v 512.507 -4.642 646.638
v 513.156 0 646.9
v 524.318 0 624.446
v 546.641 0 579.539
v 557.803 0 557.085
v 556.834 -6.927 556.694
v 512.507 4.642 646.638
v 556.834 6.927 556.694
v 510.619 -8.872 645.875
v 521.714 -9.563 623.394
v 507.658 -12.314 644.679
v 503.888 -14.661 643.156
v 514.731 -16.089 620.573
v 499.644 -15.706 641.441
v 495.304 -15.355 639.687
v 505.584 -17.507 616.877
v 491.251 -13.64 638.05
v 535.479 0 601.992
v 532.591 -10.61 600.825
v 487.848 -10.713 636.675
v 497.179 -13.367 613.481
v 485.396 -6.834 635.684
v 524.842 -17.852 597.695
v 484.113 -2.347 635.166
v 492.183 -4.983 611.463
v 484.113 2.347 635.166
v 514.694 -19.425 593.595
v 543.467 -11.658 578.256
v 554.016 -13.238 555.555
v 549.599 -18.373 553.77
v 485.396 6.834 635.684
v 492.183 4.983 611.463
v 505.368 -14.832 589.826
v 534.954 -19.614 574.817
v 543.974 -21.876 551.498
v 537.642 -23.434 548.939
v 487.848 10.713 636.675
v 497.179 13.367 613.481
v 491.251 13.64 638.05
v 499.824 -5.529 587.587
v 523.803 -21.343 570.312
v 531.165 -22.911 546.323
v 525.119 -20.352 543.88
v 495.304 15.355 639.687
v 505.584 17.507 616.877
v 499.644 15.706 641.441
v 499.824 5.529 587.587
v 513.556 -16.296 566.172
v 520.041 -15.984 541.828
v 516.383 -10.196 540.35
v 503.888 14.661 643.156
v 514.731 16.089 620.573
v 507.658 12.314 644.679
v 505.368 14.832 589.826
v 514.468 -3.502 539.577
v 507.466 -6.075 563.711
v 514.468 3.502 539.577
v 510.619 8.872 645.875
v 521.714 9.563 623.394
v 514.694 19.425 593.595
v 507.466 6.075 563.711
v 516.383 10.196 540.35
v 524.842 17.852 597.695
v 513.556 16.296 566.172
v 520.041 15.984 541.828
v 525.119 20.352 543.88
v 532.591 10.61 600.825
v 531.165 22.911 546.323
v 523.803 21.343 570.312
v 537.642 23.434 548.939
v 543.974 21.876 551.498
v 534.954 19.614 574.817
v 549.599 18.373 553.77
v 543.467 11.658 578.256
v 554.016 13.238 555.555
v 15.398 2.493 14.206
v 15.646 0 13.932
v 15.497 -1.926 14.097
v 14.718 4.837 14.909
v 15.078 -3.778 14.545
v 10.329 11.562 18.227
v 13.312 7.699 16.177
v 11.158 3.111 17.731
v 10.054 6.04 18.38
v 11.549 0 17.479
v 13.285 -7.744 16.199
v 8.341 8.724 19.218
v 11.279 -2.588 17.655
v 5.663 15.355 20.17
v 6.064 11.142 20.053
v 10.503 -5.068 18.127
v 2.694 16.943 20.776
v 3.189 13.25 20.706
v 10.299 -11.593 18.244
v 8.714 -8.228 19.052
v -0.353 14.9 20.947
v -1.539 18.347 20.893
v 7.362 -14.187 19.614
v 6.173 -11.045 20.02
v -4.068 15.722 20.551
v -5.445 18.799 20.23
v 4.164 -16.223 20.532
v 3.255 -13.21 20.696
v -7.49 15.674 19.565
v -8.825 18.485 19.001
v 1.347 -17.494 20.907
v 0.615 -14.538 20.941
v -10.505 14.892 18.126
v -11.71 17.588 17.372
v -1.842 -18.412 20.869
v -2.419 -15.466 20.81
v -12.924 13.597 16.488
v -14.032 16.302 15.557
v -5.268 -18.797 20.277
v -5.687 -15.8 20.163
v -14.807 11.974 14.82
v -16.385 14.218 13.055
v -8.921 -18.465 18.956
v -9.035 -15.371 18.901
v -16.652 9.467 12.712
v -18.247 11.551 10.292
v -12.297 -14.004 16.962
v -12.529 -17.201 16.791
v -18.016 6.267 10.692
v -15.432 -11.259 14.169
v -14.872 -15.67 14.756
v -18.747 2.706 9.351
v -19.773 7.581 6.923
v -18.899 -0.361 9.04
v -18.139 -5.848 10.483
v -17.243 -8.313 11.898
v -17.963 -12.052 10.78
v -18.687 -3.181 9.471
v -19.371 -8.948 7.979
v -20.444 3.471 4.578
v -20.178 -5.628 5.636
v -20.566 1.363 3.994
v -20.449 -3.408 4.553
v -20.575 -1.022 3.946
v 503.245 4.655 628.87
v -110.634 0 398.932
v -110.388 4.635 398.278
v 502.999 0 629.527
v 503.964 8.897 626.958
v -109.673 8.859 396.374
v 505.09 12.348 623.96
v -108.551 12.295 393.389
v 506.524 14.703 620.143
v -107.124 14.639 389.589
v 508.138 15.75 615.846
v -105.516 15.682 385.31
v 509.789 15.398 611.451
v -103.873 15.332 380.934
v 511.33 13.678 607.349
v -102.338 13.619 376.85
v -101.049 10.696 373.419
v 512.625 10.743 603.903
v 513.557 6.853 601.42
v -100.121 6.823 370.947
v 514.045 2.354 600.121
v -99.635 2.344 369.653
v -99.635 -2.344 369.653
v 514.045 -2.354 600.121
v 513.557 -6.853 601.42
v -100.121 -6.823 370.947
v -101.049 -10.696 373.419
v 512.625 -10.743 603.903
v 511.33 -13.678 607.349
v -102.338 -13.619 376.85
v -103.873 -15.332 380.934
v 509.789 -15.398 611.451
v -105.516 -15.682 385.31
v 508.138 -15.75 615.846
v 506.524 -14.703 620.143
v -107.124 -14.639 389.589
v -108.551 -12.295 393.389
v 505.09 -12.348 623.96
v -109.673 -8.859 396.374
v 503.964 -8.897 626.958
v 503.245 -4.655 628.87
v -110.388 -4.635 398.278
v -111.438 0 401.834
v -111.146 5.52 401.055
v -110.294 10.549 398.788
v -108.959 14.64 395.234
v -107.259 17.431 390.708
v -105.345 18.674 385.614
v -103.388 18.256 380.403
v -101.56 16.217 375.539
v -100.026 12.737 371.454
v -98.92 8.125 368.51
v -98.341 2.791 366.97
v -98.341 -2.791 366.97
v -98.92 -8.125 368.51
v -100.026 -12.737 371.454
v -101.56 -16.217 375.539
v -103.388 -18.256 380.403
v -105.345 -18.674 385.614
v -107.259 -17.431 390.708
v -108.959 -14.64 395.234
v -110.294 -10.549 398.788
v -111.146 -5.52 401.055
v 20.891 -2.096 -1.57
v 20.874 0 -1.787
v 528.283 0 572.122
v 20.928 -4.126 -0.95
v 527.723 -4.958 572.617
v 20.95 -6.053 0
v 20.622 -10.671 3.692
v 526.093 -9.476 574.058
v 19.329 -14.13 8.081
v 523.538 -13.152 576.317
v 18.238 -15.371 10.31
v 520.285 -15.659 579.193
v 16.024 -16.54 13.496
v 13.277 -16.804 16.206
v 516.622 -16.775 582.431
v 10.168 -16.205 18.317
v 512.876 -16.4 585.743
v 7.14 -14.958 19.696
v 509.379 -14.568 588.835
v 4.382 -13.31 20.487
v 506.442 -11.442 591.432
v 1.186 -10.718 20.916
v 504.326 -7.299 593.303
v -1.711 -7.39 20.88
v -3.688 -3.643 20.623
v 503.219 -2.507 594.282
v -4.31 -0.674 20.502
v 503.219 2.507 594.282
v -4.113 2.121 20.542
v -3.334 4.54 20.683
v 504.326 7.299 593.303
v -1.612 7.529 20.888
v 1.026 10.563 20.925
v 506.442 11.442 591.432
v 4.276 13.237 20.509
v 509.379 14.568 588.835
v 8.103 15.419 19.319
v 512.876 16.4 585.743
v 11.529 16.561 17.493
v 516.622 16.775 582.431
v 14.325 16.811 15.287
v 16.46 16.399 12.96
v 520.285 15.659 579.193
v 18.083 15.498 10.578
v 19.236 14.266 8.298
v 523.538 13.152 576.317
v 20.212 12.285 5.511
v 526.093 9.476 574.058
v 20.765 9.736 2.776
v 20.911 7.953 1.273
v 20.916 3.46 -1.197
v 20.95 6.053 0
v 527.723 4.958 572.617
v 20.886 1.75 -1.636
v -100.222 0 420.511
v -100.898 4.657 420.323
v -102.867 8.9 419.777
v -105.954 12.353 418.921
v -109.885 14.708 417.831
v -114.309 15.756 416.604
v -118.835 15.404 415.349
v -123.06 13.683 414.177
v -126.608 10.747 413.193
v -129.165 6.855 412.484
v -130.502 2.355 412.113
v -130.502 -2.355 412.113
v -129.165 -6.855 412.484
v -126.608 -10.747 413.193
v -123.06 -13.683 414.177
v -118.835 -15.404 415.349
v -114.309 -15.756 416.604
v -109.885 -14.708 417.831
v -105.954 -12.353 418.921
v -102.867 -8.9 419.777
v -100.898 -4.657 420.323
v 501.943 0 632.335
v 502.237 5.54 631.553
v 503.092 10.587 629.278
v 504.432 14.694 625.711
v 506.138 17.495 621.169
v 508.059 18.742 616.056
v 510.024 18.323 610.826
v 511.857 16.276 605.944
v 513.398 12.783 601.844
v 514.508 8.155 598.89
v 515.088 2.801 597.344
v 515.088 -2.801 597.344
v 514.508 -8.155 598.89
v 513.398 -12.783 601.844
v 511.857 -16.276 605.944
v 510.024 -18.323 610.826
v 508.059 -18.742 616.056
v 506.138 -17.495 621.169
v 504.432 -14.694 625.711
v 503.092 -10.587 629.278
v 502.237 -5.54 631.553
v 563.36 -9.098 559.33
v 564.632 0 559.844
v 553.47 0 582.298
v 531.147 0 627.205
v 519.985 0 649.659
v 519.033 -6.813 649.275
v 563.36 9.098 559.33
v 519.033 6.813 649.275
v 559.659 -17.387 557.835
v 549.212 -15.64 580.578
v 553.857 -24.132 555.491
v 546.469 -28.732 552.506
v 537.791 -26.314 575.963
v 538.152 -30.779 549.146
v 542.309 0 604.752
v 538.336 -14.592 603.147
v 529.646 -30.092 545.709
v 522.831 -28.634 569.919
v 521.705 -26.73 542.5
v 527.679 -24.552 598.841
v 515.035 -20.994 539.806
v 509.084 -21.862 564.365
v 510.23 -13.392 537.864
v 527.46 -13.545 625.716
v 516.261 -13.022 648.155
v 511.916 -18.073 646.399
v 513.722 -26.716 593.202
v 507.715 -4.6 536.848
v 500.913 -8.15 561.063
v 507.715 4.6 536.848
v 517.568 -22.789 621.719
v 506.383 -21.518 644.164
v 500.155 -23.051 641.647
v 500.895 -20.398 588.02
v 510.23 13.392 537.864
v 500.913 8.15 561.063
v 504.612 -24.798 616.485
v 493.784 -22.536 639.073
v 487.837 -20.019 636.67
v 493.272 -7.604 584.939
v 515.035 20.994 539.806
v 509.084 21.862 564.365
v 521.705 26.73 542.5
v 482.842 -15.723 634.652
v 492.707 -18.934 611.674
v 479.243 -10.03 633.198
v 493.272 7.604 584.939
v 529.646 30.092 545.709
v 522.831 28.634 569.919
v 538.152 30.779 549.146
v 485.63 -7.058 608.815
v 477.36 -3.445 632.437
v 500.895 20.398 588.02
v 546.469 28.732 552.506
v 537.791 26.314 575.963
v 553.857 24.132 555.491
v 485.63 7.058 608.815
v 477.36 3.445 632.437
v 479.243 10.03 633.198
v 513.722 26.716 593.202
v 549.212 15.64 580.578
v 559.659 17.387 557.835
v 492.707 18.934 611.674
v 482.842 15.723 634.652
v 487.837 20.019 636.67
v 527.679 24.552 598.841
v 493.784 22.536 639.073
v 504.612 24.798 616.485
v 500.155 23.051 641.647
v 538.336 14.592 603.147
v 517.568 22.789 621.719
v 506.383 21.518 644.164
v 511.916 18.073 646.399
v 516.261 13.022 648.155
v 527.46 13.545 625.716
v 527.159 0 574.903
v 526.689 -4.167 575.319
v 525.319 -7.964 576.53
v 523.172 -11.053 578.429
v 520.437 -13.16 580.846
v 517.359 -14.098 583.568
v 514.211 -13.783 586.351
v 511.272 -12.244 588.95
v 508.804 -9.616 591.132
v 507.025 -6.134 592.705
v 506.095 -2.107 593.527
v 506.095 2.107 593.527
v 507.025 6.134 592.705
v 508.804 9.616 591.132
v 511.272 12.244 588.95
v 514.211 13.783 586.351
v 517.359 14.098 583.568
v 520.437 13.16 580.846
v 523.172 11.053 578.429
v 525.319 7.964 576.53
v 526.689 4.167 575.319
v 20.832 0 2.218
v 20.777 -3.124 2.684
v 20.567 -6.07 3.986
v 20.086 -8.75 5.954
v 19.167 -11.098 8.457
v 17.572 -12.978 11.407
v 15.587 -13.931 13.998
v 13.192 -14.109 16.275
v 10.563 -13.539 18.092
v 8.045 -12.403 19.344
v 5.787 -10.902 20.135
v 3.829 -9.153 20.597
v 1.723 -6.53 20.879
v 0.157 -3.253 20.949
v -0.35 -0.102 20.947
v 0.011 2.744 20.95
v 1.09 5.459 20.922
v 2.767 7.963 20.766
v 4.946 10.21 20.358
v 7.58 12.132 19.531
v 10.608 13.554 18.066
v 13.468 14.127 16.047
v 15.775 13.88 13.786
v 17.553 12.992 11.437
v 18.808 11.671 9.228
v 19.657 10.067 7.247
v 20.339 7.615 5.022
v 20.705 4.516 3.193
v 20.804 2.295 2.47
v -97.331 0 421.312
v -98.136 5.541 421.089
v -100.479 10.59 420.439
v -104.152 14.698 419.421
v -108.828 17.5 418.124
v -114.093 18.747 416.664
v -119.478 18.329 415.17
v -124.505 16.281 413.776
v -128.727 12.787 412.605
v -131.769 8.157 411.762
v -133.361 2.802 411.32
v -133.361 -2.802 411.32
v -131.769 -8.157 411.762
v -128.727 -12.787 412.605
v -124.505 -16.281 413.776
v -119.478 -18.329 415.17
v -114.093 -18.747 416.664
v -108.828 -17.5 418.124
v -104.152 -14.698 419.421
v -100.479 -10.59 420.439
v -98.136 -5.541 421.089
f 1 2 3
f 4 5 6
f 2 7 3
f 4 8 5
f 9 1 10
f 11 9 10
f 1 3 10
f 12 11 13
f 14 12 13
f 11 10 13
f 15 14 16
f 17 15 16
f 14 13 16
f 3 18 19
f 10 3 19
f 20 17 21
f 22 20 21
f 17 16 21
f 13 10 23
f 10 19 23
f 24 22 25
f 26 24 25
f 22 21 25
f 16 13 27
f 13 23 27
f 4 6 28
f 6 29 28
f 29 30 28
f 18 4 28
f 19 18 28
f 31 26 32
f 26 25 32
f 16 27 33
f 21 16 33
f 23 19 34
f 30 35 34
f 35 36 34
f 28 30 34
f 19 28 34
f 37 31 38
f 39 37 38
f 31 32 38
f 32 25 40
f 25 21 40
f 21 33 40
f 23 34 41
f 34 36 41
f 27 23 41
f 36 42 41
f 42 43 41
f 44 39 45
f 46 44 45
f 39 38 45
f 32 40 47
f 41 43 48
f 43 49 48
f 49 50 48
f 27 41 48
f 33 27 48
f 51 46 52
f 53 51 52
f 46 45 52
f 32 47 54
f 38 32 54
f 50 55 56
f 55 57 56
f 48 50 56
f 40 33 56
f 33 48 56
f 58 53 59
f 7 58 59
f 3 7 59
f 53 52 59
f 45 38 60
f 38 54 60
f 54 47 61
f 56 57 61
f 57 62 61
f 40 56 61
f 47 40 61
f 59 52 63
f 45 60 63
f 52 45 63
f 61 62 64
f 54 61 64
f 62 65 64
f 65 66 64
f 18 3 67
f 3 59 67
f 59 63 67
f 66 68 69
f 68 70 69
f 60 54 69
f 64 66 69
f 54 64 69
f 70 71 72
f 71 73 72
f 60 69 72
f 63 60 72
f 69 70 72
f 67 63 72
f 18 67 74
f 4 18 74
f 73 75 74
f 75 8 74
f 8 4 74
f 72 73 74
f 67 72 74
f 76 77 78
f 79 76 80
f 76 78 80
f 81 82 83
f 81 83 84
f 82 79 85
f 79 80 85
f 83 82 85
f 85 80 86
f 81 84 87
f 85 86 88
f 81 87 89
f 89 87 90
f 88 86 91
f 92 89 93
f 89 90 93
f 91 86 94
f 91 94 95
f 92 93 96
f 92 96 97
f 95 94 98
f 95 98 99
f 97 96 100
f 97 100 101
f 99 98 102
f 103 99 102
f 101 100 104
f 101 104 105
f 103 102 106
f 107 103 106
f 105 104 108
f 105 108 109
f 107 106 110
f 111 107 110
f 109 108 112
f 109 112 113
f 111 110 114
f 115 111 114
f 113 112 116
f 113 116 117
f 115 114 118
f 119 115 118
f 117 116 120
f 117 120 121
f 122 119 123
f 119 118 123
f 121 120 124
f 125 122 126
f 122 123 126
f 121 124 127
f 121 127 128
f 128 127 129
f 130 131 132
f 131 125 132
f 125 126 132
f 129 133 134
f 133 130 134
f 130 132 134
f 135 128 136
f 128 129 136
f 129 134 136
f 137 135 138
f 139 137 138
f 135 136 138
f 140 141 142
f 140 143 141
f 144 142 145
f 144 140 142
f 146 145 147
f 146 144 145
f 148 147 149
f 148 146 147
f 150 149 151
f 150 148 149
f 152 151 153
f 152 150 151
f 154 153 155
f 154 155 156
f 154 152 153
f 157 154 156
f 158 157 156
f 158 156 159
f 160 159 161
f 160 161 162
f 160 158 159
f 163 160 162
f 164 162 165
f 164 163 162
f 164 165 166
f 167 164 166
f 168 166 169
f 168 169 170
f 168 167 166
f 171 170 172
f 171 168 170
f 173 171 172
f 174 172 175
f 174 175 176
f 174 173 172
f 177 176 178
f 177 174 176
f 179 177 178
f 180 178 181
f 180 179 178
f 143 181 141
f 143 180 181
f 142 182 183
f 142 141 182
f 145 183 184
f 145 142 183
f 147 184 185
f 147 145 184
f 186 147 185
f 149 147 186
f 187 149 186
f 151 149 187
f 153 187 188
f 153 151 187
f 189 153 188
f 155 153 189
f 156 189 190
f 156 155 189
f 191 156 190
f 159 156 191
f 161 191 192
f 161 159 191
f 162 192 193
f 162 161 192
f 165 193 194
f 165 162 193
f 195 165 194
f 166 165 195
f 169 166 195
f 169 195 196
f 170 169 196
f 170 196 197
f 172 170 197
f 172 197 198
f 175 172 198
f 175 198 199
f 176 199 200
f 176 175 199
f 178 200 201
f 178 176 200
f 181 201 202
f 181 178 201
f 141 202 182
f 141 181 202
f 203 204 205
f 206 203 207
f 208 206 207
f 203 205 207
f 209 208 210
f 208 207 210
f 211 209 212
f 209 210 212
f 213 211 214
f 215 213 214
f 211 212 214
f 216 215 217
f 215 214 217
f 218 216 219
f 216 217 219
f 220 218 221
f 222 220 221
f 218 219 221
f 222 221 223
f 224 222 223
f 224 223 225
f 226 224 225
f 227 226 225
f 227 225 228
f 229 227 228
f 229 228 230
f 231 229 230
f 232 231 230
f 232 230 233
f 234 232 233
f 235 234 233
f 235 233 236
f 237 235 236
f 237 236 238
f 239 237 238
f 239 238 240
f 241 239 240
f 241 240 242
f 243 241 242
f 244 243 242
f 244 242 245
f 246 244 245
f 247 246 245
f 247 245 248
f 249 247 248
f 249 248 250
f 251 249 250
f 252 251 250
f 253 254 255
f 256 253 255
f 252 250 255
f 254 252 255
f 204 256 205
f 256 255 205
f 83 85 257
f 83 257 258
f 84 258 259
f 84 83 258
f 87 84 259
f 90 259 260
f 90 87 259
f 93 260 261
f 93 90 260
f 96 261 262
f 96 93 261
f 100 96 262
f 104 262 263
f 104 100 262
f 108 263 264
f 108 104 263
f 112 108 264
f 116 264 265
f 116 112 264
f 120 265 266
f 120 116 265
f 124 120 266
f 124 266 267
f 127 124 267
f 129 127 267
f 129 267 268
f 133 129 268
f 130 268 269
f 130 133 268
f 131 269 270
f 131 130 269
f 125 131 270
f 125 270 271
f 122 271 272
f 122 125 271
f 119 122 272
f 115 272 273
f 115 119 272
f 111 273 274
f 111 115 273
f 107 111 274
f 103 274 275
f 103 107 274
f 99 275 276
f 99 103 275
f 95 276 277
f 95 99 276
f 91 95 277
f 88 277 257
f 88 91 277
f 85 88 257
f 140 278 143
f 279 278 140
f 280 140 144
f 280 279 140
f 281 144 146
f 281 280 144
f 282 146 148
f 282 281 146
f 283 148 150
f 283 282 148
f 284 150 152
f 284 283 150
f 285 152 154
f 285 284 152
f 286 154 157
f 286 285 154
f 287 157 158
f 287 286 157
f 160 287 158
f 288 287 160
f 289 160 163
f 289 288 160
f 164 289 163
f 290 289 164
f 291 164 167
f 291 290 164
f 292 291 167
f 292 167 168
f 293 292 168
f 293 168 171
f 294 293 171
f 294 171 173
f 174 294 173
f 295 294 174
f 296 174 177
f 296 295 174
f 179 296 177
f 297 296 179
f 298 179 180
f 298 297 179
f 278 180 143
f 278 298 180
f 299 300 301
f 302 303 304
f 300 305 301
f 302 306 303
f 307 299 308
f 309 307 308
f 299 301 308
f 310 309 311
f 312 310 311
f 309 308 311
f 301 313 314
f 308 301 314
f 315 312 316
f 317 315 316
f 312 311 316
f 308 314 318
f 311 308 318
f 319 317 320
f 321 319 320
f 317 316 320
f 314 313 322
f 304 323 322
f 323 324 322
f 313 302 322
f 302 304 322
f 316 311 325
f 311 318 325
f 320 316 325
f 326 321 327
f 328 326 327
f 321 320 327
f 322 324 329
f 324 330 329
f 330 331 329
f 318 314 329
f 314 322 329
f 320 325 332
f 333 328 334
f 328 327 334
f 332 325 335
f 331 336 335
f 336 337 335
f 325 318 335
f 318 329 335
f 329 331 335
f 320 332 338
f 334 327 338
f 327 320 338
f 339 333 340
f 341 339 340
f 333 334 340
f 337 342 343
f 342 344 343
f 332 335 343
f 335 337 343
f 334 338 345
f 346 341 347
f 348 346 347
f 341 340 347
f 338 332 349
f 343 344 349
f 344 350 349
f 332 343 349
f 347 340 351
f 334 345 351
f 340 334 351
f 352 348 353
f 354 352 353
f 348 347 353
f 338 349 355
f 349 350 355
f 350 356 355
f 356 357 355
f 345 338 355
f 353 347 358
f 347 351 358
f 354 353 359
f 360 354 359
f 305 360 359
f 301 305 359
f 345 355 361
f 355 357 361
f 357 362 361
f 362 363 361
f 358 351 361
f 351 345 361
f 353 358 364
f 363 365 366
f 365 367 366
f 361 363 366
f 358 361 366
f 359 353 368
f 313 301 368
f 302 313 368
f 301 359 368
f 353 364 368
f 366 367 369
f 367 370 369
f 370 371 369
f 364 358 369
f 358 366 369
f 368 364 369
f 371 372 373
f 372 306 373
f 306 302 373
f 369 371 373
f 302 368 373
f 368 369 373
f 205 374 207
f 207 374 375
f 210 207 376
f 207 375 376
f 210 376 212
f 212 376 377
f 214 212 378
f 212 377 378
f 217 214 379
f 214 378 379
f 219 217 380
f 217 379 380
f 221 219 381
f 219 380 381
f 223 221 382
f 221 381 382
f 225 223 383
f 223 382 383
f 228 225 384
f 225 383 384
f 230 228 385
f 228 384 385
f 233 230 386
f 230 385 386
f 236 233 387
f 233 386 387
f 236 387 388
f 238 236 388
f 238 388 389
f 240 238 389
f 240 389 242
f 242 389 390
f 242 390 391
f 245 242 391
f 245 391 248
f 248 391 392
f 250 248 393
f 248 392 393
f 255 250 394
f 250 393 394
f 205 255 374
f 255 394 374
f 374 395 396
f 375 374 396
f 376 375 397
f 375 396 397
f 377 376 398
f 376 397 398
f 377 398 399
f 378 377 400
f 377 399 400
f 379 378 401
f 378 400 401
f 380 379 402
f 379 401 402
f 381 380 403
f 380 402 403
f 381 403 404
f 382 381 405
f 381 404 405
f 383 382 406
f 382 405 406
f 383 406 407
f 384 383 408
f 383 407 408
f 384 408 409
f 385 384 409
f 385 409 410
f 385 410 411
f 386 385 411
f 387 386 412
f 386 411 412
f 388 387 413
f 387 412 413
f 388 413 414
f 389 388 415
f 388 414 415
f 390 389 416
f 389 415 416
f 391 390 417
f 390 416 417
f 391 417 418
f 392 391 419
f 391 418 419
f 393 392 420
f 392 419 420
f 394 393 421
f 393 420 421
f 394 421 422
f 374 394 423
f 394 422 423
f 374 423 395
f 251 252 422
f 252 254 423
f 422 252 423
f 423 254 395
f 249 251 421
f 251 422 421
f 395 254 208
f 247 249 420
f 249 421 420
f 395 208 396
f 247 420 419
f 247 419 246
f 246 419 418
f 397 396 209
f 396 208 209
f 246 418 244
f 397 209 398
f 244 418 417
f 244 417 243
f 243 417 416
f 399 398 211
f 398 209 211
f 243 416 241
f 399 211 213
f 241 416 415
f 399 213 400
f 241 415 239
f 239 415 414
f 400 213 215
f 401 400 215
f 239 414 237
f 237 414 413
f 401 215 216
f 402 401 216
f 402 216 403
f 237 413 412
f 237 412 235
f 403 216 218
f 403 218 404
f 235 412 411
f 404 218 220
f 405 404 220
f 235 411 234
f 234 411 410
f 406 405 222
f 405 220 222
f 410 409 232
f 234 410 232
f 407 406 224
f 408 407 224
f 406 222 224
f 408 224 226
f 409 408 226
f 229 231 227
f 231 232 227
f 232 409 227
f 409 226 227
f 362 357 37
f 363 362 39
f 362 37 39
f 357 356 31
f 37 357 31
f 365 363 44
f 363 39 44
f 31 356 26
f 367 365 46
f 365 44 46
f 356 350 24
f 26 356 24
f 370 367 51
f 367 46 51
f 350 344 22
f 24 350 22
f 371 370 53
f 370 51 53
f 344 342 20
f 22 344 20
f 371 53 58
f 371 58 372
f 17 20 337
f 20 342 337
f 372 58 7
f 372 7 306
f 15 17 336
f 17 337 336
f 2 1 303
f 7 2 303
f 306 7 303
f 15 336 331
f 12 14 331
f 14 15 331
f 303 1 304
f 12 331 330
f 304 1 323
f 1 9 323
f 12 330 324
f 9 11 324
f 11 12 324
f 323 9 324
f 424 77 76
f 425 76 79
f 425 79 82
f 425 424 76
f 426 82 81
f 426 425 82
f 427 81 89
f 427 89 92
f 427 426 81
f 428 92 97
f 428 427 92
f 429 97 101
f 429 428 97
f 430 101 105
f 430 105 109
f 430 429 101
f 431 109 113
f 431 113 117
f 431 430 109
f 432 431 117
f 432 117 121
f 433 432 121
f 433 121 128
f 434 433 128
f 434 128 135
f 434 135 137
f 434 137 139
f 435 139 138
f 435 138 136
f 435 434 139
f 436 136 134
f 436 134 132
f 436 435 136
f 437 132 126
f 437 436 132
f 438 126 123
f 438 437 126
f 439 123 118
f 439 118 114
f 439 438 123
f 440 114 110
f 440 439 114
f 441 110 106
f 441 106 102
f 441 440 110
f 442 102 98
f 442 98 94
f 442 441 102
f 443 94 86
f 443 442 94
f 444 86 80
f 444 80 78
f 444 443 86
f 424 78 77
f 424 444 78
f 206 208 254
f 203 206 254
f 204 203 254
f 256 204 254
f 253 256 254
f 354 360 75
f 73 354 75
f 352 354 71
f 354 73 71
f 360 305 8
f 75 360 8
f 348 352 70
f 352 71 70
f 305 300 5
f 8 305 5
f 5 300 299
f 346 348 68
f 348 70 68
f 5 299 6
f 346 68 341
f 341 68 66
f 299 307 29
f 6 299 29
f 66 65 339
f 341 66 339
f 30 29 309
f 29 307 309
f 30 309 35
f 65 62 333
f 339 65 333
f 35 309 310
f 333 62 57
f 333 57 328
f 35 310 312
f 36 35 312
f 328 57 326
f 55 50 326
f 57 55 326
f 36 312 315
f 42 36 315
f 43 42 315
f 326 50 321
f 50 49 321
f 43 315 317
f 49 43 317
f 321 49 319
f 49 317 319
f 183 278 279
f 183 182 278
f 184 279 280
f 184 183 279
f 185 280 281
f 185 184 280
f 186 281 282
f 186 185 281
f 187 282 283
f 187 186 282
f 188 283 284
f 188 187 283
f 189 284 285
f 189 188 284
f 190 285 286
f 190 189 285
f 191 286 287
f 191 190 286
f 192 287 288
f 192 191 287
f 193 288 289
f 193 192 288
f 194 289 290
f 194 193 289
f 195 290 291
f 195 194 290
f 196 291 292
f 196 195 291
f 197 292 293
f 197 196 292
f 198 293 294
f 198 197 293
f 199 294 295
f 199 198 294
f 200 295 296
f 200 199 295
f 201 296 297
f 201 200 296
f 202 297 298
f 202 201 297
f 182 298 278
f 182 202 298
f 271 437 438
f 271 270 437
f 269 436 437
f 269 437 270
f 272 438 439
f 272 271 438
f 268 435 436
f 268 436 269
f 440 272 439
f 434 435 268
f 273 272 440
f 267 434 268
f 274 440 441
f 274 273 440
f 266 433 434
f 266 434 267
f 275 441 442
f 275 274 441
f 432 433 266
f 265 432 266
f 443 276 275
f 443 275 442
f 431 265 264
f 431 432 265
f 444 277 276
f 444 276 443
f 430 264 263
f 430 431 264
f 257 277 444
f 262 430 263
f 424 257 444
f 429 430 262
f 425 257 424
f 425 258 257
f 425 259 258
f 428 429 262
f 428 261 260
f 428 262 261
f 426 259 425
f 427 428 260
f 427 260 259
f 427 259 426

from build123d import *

# Parameters (mm, degrees)
F3_R      = 20.95
F4_DEPTH  = 34
F11_DEPTH = 34


with BuildPart() as f2:
    # F1 (on Front) → F2 (revolve)
    with BuildSketch(Plane.XZ):
        Polygon((-100.2216173051, 420.5107221282), (15.2253611607, 4.222366342), (18.1162525203, 5.0240814703), (-97.3307259455, 421.3124372564), align=None)
    revolve(axis=Axis((-57.7234892329, 0, 208.1441778931), (-0.2672383761, 0, 0.9636304532)))

    # F3 (on Front) → F4 (cut, symmetric)
    with BuildSketch(Plane.XZ):
        Circle(F3_R)
    extrude(amount=F4_DEPTH, both=True, mode=Mode.SUBTRACT)


with BuildPart() as f6:
    # F5 (on Front) → F6 (revolve)
    with BuildSketch(Plane.XZ):
        Polygon((519.9854747557, 649.6592731855), (513.1561672436, 646.9000538463), (557.8025014581, 557.0848694886), (564.6318089702, 559.8440888278), align=None)
    revolve(axis=Axis((517.283351205, 0, 594.6408072717), (0.3746065934, 0, -0.9271838546)))


with BuildPart() as f8:
    # F7 (on Front) → F8 (revolve)
    with BuildSketch(Plane.XZ):
        Polygon((501.9433554963, 632.3349844185), (-111.4384028246, 401.833898988), (-110.6335066782, 398.9315372473), (502.9986639738, 629.5267244559), align=None)
    revolve(axis=Axis((201.2858190491, 0, 499.3107872101), (-0.9361233845, 0, -0.3516717347)))


with BuildPart() as f10:
    # F9 (on Front) → F10 (revolve)
    with BuildSketch(Plane.XZ):
        Polygon((5.918784176, -14.6495049022), (7.0426039562, -17.4310564659), (528.2832571646, 572.1216891941), (527.1594373843, 574.9032407578), align=None)
    revolve(axis=Axis((260.6203266042, 0, 294.77637283), (-0.6623694184, 0, -0.7491773845)))

    # F3 (on Front) → F11 (cut, symmetric)
    with BuildSketch(Plane.XZ):
        Circle(F3_R)
    extrude(amount=F11_DEPTH, both=True, mode=Mode.SUBTRACT)


solid = Compound([f2.part, f6.part, f8.part, f10.part])
